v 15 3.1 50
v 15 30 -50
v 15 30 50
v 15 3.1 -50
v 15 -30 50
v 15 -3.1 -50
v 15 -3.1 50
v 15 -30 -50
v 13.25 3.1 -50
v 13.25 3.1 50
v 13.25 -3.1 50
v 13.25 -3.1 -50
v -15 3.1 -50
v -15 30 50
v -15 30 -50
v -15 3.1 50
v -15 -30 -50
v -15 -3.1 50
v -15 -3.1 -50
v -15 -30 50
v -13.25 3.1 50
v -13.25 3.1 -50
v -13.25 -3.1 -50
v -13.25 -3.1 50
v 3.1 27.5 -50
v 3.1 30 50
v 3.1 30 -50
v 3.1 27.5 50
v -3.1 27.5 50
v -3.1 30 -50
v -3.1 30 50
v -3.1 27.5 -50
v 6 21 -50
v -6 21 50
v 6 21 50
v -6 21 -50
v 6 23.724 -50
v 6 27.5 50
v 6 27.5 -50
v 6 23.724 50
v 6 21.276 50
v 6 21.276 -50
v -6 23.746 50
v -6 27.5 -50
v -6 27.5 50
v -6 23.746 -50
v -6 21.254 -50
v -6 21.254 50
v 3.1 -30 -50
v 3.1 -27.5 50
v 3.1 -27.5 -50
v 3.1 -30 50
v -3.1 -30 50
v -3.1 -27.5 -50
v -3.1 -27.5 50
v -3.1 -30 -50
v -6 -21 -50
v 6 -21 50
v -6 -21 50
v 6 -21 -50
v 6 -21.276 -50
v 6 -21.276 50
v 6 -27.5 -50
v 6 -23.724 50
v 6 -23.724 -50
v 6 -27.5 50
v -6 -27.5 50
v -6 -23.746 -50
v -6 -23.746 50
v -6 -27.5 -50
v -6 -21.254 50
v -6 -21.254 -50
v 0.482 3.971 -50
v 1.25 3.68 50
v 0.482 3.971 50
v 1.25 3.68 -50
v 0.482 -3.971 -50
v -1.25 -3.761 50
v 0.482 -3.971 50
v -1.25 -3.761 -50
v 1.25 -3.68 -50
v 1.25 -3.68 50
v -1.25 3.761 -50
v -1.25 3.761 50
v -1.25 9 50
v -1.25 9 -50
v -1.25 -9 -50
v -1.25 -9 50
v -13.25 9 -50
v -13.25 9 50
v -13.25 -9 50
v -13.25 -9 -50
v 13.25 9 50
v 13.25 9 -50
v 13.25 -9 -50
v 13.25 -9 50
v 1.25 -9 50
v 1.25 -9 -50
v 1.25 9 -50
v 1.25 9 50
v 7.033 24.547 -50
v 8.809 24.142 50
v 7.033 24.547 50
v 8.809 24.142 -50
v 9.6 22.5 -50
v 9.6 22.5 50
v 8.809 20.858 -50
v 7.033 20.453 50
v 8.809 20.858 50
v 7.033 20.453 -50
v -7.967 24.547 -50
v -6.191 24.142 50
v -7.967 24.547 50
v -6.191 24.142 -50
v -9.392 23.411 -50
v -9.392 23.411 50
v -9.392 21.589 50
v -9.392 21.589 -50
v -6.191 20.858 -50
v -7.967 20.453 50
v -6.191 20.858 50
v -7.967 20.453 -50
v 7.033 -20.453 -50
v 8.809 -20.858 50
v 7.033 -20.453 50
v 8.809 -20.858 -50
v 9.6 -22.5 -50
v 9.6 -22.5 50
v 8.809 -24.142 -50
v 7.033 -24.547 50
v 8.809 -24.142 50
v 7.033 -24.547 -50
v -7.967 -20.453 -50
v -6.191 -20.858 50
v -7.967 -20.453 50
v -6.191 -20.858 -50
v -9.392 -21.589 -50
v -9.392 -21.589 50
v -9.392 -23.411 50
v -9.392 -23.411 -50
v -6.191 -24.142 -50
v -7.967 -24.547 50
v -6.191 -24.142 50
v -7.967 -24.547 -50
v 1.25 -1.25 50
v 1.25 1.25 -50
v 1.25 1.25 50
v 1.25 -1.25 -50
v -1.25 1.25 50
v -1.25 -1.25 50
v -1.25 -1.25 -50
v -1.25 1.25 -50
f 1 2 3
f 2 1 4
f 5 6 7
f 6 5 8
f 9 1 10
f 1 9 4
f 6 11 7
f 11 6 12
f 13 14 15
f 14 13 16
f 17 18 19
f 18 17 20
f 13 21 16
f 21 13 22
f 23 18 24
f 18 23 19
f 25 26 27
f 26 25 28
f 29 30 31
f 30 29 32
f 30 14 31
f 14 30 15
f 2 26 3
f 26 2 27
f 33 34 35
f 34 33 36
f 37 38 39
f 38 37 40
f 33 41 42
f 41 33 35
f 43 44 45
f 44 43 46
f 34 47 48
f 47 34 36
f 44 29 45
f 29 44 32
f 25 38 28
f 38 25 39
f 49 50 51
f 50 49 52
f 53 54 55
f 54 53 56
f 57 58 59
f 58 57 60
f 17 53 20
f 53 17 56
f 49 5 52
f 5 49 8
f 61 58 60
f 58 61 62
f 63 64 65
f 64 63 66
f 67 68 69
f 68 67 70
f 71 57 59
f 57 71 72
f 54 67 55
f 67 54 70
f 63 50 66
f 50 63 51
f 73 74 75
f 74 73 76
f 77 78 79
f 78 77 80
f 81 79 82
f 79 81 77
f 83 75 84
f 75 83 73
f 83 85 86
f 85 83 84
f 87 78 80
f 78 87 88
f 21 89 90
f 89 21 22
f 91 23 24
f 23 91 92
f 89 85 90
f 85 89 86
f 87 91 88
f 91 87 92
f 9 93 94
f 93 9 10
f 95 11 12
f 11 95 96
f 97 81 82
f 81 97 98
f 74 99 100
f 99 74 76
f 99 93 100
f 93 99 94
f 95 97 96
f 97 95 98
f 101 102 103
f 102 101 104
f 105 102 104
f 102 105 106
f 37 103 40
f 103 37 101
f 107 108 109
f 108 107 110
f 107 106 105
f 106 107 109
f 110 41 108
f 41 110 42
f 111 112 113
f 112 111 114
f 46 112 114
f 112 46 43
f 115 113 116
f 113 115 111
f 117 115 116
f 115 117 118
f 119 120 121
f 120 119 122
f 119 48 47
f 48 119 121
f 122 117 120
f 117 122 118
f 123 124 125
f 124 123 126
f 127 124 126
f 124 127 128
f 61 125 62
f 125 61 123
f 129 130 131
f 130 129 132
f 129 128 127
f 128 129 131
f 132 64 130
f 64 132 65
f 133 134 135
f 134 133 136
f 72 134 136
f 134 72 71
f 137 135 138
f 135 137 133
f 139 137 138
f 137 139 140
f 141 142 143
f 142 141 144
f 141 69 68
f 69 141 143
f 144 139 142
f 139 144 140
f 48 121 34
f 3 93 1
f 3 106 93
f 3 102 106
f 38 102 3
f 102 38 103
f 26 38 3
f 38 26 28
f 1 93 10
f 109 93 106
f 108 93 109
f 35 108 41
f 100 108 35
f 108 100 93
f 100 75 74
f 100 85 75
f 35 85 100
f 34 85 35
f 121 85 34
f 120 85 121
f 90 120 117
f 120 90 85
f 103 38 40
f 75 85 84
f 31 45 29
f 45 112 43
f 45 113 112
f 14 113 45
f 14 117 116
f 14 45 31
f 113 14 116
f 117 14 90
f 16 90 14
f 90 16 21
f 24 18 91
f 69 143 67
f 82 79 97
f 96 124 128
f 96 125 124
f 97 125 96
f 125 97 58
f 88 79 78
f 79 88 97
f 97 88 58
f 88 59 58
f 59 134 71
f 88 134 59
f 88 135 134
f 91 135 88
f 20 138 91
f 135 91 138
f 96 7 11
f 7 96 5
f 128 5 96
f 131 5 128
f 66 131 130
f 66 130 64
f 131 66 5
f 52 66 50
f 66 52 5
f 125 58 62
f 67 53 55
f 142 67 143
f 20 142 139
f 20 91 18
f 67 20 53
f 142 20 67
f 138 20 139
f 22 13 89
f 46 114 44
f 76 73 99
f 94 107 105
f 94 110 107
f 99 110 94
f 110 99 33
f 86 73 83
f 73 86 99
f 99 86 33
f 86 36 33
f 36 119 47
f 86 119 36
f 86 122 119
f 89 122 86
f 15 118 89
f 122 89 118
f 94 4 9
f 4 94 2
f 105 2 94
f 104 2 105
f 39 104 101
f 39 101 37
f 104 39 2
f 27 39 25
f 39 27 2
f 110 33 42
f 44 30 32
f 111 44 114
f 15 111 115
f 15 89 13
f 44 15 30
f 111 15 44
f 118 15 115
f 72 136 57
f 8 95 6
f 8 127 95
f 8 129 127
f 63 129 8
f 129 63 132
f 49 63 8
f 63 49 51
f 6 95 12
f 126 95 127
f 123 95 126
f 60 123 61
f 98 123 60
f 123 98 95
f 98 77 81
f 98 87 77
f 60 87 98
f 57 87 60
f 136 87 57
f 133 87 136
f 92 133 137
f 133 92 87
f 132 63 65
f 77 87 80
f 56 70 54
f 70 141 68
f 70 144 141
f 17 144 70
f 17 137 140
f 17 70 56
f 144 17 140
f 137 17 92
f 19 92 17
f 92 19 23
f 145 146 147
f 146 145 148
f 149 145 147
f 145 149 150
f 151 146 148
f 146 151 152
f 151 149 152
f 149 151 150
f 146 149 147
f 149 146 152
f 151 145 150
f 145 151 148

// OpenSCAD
// Parameters
cross_section_width = 30.0; //[15.0:60.0:0.5]
cross_section_height = 60.0; //[30.0:120.0:0.5]
length = 100.0; //[50.0:200.0:1]
center = 1; //[0:1:1]
cornerHole = 1; //[0:1:1]
wall_thickness = 2.5; //[1.2:5.0:0.1]
slot_opening_width = 6.2; //[4.0:10.0:0.1]
slot_cavity_width = 12.0; //[8.0:18.0:0.1]
slot_depth = 8.0; //[4.0:14.0:0.1]
slot_neck_depth = 2.5; //[1.0:5.0:0.1]
center_bore_diameter = 8.0; //[4.0:16.0:0.1]
internal_void_width = 12.0; //[6.0:22.0:0.1]
internal_void_height = 18.0; //[8.0:30.0:0.1]
web_thickness = 2.5; //[1.2:5.0:0.1]
corner_hole_diameter = 4.2; //[0.0:8.0:0.1]
corner_hole_offset = 7.5; //[4.0:15.0:0.1]
overlap = 1.0; //[0.5:2.0:0.1]

// Extrusion Cross Section
module extrusion_cross_section() {
  difference() {
    color("Silver") cube([cross_section_width, cross_section_height, length], center=true);
    union() {
      // T-slot channels
      translate([cross_section_width/2 - (slot_depth + overlap)/2, 0, 0])
        cube([slot_depth + overlap, slot_opening_width, length + 2*overlap], center=true);
      translate([cross_section_width/2 - slot_neck_depth - (slot_depth - slot_neck_depth + overlap)/2, 0, 0])
        cube([slot_depth - slot_neck_depth + overlap, slot_cavity_width, length + 2*overlap], center=true);
      translate([-cross_section_width/2 + (slot_depth + overlap)/2, 0, 0])
        cube([slot_depth + overlap, slot_opening_width, length + 2*overlap], center=true);
      translate([-cross_section_width/2 + slot_neck_depth + (slot_depth - slot_neck_depth + overlap)/2, 0, 0])
        cube([slot_depth - slot_neck_depth + overlap, slot_cavity_width, length + 2*overlap], center=true);
      translate([0, cross_section_height/2 - (slot_depth + overlap)/2, 0])
        cube([slot_opening_width, slot_depth + overlap, length + 2*overlap], center=true);
      translate([0, cross_section_height/2 - slot_neck_depth - (slot_depth - slot_neck_depth + overlap)/2, 0])
        cube([slot_cavity_width, slot_depth - slot_neck_depth + overlap, length + 2*overlap], center=true);
      translate([0, -cross_section_height/2 + (slot_depth + overlap)/2, 0])
        cube([slot_opening_width, slot_depth + overlap, length + 2*overlap], center=true);
      translate([0, -cross_section_height/2 + slot_neck_depth + (slot_depth - slot_neck_depth + overlap)/2, 0])
        cube([slot_cavity_width, slot_depth - slot_neck_depth + overlap, length + 2*overlap], center=true);
    }
    // Center bore and internal voids
    union() {
      cylinder(r=center_bore_diameter/2, h=length + 2*overlap, center=true);
      translate([-(internal_void_width/2 + web_thickness/2), 0, 0])
        cube([internal_void_width, internal_void_height, length + 2*overlap], center=true);
      translate([(internal_void_width/2 + web_thickness/2), 0, 0])
        cube([internal_void_width, internal_void_height, length + 2*overlap], center=true);
    }
    // Corner holes
    if (cornerHole) {
      union() {
        translate([cross_section_width/2 - corner_hole_offset, cross_section_height/2 - corner_hole_offset, 0])
          cylinder(r=corner_hole_diameter/2, h=length + 2*overlap, center=true);
        translate([-cross_section_width/2 + corner_hole_offset, cross_section_height/2 - corner_hole_offset, 0])
          cylinder(r=corner_hole_diameter/2, h=length + 2*overlap, center=true);
        translate([cross_section_width/2 - corner_hole_offset, -cross_section_height/2 + corner_hole_offset, 0])
          cylinder(r=corner_hole_diameter/2, h=length + 2*overlap, center=true);
        translate([-cross_section_width/2 + corner_hole_offset, -cross_section_height/2 + corner_hole_offset, 0])
          cylinder(r=corner_hole_diameter/2, h=length + 2*overlap, center=true);
      }
    }
  }
}

// Box Corner Profile Section
module box_corner_profile_section() {
  color("DimGray") cube([wall_thickness, wall_thickness, length], center=true);
}

// Box Corner Profile Sections
module box_corner_profile_sections() {
  union() {
    box_corner_profile_section();
    rotate([0, 0, 90]) box_corner_profile_section();
    rotate([0, 0, 180]) box_corner_profile_section();
    rotate([0, 0, 270]) box_corner_profile_section();
  }
}

// Extrusion
module extrusion() {
  union() {
    extrusion_cross_section();
    box_corner_profile_sections();
  }
}

// Assembly
module assembly() {
  extrusion();
}

assembly();
